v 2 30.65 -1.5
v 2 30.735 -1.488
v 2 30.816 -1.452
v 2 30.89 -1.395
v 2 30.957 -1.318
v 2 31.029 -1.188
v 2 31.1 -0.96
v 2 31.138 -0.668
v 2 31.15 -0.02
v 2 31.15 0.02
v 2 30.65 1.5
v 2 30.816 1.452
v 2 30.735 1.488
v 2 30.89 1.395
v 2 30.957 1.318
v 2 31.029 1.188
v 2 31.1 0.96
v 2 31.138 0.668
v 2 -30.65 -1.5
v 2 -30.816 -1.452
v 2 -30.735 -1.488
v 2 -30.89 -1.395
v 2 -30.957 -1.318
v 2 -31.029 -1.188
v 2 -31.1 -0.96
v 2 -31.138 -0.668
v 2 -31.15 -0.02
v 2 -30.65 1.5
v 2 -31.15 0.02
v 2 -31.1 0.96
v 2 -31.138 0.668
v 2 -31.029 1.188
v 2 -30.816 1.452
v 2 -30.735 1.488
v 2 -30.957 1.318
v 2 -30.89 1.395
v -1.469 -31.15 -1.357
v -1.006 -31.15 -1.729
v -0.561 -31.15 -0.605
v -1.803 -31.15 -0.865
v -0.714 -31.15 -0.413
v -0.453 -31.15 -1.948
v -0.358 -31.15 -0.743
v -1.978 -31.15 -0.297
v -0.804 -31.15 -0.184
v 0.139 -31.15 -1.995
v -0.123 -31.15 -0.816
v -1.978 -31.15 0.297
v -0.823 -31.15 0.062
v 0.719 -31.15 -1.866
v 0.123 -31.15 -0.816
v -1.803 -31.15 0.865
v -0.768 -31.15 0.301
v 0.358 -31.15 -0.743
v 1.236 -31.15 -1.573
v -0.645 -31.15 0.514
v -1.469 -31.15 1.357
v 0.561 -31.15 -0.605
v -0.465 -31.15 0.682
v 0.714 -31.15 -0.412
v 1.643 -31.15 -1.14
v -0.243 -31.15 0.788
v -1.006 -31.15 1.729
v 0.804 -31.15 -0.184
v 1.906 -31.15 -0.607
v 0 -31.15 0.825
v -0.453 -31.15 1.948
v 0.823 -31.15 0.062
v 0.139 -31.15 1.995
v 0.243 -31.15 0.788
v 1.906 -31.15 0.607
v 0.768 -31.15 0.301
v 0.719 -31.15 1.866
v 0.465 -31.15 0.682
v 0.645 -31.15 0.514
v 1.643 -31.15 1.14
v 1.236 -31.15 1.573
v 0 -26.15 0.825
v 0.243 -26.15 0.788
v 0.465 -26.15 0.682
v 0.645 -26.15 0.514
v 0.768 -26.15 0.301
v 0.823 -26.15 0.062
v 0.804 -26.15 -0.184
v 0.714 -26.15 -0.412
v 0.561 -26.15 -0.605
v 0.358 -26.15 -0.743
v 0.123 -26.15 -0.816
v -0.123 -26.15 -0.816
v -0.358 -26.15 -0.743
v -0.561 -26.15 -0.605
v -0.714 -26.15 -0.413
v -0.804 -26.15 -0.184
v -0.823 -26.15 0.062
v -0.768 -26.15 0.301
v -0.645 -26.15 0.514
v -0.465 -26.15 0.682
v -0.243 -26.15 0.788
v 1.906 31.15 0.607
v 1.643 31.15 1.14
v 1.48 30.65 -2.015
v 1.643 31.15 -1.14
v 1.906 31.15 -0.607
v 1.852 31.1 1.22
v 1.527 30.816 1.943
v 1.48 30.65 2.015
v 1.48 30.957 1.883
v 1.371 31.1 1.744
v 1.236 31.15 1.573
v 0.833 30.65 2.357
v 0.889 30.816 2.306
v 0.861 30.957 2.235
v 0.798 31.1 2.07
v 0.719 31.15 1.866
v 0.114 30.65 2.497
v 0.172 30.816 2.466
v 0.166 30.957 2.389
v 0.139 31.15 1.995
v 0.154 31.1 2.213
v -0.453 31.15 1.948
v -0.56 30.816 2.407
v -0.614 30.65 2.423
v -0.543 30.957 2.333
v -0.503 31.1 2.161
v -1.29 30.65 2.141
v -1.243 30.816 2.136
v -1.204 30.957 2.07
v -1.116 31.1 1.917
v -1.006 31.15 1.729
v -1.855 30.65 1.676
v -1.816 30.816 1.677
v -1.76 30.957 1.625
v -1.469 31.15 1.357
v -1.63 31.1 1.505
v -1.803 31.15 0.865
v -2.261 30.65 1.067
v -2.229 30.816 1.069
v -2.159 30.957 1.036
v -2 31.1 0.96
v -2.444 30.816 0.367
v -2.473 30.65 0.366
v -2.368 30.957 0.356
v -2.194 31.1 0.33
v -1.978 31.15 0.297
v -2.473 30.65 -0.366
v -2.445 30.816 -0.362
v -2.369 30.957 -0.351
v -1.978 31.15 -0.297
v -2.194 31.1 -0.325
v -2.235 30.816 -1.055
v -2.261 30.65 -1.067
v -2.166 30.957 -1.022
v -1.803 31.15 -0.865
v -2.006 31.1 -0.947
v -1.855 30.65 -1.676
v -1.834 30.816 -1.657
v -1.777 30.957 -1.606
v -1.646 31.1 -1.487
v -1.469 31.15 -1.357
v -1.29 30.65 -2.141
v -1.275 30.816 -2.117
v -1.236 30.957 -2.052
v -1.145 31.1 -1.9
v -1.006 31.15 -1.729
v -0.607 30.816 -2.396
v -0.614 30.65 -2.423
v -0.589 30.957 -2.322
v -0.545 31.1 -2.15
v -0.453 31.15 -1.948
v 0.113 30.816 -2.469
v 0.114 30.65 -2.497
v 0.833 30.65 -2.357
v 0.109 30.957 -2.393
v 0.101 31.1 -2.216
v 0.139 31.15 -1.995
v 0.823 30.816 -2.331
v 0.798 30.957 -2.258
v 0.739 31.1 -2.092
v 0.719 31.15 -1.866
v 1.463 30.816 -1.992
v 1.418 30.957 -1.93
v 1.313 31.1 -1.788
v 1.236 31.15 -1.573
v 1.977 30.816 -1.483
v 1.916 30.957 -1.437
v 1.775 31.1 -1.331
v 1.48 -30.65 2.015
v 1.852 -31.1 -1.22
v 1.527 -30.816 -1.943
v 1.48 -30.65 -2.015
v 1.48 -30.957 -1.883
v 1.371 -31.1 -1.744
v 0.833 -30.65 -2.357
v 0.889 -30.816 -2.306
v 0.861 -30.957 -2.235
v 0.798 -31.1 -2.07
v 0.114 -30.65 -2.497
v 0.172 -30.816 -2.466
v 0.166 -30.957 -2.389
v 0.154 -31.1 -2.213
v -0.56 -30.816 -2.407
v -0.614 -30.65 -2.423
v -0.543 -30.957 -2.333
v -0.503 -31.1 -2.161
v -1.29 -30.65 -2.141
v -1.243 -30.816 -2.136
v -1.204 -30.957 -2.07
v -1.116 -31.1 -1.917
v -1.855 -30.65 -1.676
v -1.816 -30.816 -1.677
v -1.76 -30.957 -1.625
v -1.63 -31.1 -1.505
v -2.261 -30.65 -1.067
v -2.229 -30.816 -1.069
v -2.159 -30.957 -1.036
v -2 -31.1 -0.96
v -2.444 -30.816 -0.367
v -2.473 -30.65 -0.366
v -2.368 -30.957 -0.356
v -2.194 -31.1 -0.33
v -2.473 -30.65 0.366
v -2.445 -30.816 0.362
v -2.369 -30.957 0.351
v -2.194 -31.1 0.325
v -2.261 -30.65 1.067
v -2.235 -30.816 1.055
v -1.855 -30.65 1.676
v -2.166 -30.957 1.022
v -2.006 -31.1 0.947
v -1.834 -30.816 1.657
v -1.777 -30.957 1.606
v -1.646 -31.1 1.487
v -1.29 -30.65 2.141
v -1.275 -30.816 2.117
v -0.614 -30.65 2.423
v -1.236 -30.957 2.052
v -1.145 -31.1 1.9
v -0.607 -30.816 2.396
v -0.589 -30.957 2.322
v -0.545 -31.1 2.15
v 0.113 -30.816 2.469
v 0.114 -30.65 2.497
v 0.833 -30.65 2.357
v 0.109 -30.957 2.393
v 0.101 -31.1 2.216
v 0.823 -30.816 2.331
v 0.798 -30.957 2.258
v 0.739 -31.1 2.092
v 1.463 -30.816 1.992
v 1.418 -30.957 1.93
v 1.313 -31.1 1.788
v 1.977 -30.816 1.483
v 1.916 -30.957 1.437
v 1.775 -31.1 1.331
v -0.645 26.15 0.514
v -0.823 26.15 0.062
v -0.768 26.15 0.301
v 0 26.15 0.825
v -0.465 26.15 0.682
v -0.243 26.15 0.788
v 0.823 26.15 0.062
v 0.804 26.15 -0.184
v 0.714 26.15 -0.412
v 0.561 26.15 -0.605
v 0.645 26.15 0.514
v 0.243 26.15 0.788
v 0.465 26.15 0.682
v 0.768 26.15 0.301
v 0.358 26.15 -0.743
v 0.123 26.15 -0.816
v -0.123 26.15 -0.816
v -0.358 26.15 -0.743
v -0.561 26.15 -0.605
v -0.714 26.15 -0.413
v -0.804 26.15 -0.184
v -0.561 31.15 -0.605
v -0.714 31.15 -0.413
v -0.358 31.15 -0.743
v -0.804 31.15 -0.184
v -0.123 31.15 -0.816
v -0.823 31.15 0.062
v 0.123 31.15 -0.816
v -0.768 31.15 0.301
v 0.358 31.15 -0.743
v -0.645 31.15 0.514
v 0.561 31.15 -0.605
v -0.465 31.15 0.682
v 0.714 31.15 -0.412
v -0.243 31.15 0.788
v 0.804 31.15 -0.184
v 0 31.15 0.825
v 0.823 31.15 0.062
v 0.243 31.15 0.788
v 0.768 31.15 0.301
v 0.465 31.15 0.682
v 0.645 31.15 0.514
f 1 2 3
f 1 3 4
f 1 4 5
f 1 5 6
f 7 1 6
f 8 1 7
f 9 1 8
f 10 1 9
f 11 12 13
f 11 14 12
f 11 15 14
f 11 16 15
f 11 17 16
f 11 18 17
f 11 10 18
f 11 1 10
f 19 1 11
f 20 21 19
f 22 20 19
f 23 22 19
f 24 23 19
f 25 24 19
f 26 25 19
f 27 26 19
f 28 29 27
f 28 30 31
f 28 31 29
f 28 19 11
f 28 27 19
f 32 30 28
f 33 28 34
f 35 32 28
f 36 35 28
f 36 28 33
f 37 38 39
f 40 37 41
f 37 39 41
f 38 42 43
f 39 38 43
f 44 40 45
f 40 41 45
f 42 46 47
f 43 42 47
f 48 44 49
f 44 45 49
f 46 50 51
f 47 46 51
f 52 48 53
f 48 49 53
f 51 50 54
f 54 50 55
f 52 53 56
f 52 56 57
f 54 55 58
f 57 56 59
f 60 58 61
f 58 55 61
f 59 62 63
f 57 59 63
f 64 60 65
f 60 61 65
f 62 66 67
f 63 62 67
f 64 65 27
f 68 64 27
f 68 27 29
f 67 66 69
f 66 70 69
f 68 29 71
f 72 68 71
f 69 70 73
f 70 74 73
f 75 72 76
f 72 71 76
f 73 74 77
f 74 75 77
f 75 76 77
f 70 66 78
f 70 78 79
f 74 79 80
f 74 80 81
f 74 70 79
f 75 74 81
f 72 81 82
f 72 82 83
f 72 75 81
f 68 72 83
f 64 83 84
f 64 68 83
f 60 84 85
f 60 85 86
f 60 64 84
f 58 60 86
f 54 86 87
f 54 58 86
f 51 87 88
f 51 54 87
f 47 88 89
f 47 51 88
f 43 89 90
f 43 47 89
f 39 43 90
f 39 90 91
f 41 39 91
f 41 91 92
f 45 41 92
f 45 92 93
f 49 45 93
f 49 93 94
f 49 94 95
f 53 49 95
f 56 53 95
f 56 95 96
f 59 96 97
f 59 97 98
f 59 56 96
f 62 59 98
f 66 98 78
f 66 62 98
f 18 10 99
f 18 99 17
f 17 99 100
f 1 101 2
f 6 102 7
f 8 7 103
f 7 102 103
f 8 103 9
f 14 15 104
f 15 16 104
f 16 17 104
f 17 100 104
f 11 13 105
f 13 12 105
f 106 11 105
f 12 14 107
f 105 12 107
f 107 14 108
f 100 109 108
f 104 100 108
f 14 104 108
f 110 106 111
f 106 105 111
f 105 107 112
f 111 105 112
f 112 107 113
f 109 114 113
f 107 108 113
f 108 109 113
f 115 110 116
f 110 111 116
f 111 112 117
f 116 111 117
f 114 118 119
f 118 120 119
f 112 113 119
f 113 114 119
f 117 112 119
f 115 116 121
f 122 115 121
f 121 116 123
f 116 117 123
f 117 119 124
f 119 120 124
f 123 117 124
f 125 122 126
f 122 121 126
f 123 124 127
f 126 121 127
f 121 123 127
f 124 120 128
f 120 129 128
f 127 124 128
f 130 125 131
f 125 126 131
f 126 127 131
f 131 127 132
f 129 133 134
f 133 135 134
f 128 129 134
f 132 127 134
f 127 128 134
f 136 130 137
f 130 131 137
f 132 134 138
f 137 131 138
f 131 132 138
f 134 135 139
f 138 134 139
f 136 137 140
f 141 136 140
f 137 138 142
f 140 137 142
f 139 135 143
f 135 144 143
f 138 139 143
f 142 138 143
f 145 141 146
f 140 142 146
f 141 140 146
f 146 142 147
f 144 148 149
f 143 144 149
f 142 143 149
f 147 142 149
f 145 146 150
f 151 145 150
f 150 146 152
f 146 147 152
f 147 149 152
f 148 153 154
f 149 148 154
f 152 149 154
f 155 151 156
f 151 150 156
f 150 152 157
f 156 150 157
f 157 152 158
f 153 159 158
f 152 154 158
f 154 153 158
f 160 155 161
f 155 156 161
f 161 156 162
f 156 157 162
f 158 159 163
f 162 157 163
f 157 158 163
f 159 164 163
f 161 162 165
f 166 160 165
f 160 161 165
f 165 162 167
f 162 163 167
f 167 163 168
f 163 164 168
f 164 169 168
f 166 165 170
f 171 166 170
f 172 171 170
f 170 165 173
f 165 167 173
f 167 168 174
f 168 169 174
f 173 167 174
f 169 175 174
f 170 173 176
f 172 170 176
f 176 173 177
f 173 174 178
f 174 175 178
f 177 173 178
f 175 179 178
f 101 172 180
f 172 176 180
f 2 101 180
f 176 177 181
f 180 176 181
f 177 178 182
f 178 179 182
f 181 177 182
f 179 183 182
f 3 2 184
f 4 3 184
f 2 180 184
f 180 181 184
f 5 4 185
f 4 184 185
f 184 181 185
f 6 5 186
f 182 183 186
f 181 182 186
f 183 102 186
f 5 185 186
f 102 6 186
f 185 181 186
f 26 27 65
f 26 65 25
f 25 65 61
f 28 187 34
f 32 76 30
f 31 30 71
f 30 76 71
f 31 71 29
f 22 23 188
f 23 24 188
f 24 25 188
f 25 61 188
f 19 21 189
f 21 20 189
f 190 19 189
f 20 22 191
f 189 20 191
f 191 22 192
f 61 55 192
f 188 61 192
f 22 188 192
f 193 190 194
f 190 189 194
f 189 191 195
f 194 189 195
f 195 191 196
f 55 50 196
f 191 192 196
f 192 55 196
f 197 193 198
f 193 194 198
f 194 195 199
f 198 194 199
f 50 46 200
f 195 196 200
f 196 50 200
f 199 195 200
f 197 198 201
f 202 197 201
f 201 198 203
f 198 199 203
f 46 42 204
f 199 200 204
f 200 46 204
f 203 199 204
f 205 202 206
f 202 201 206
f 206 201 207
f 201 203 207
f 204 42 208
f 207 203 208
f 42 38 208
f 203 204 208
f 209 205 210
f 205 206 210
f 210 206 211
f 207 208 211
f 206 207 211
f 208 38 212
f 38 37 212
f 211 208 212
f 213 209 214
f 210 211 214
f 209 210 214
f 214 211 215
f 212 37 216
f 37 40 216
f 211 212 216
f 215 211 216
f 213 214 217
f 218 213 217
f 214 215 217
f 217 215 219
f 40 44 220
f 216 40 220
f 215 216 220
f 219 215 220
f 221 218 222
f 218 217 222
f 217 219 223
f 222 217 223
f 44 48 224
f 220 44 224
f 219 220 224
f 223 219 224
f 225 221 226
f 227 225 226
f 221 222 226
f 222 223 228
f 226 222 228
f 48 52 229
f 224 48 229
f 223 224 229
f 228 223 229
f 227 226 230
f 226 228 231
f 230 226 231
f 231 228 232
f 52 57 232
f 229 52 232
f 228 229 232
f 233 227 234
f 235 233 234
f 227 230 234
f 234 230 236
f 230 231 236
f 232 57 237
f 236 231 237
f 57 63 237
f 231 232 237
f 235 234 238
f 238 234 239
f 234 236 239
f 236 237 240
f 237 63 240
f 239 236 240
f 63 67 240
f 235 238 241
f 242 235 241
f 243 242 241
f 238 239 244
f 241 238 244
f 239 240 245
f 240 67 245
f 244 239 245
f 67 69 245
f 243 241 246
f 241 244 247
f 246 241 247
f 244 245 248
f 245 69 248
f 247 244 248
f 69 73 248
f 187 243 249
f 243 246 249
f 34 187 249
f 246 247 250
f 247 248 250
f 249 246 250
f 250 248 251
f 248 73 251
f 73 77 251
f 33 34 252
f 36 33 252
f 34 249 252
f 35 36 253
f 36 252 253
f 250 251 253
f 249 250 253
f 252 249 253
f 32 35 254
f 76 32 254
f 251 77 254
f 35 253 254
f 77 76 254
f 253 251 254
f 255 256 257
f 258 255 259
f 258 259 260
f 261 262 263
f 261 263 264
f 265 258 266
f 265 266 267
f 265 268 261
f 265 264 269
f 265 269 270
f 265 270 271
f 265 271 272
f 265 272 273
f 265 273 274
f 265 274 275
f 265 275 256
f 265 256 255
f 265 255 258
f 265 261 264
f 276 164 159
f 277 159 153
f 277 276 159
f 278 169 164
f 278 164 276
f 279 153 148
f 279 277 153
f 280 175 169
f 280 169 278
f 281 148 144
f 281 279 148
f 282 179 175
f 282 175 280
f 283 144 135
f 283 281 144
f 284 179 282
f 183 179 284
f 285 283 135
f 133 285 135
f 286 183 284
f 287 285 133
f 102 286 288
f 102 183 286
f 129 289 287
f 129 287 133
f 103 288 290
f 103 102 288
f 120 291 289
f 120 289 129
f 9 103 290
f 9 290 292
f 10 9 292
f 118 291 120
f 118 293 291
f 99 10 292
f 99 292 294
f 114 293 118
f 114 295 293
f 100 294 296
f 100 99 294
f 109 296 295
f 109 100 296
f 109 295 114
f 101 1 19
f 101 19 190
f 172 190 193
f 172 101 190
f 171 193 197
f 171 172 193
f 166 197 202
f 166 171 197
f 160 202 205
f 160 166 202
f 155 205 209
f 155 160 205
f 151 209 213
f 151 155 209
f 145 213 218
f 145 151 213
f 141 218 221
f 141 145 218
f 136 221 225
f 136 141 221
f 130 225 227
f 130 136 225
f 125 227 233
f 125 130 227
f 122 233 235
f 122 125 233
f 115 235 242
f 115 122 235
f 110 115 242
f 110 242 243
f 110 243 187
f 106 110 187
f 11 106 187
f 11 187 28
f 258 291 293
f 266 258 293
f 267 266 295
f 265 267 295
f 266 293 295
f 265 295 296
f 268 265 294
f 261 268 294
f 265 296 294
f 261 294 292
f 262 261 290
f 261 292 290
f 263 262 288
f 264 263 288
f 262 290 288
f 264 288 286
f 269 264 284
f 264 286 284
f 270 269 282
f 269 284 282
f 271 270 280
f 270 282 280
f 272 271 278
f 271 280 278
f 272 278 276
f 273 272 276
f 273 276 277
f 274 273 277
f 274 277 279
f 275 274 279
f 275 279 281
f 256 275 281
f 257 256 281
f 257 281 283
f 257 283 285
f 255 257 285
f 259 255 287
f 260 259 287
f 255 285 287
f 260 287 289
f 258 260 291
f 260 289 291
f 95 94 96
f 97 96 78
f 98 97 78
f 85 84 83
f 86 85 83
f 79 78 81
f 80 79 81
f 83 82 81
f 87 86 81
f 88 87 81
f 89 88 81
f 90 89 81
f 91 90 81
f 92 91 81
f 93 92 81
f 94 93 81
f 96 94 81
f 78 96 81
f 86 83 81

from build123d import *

# Parameters (mm, degrees)
SKETCH1_R            = 2.5
BOSS_EXTRUDE1_DEPTH  = 31.15
SKETCH2_R            = 0.825
CUT_EXTRUDE1_DEPTH   = 5
CUT_EXTRUDE2_DEPTH   = 32.35
FILLET1_R            = 0.5
FILLET1_OF_MIRROR1_R = 0.5


with BuildPart() as part:
    # Sketch1 → Boss-Extrude1 (new body)
    with BuildSketch(Plane(origin=(0, 0, 0), x_dir=(1, 0, 0), z_dir=(0, 1, 0))):
        with Locations(Location((0, 0, 0), (0, 0, 270))):
            Circle(SKETCH1_R)
    boss_extrude1 = extrude(amount=BOSS_EXTRUDE1_DEPTH)

    # Sketch2 → Cut-Extrude1 (cut)
    with BuildSketch(Plane(origin=(0, 31.15, 0), x_dir=(1, 0, 0), z_dir=(0, 1, 0))):
        with Locations(Location((0, 0, 0), (0, 0, 270))):
            Circle(SKETCH2_R)
    cut_extrude1 = extrude(amount=-CUT_EXTRUDE1_DEPTH, mode=Mode.SUBTRACT)

    # Sketch3 → Cut-Extrude2 (cut, through all)
    with BuildSketch(Plane(origin=(0, 31.15, 0), x_dir=(1, 0, 0), z_dir=(0, 1, 0))):
        with BuildLine():
            Line((2, 1.5), (2, -1.5))
            ThreePointArc((2, -1.5), (2.5, 0), (2, 1.5))
        make_face()
    cut_extrude2 = extrude(amount=-CUT_EXTRUDE2_DEPTH, mode=Mode.SUBTRACT)

    # Fillet1
    fillet1_edges = [part.edges().sort_by_distance(p)[0] for p in [
        (-2.5, 31.15, 0),
    ]]
    fillet(fillet1_edges, radius=FILLET1_R - 0.0001)  # a hair under: the kernel refuses the full size

    # Mirror1: Boss-Extrude1, Cut-Extrude1, Cut-Extrude2 across plane
    add(boss_extrude1.mirror(Plane.ZX))
    add(cut_extrude1.mirror(Plane.ZX), mode=Mode.SUBTRACT)
    add(cut_extrude2.mirror(Plane.ZX), mode=Mode.SUBTRACT)

    # Fillet1 of Mirror1
    fillet1_of_mirror1_edges = [part.edges().sort_by_distance(p)[0] for p in [
        (-2.5, -31.15, 0),
    ]]
    fillet(fillet1_of_mirror1_edges, radius=FILLET1_OF_MIRROR1_R - 0.0001)  # a hair under: the kernel refuses the full size


solid = part.part
